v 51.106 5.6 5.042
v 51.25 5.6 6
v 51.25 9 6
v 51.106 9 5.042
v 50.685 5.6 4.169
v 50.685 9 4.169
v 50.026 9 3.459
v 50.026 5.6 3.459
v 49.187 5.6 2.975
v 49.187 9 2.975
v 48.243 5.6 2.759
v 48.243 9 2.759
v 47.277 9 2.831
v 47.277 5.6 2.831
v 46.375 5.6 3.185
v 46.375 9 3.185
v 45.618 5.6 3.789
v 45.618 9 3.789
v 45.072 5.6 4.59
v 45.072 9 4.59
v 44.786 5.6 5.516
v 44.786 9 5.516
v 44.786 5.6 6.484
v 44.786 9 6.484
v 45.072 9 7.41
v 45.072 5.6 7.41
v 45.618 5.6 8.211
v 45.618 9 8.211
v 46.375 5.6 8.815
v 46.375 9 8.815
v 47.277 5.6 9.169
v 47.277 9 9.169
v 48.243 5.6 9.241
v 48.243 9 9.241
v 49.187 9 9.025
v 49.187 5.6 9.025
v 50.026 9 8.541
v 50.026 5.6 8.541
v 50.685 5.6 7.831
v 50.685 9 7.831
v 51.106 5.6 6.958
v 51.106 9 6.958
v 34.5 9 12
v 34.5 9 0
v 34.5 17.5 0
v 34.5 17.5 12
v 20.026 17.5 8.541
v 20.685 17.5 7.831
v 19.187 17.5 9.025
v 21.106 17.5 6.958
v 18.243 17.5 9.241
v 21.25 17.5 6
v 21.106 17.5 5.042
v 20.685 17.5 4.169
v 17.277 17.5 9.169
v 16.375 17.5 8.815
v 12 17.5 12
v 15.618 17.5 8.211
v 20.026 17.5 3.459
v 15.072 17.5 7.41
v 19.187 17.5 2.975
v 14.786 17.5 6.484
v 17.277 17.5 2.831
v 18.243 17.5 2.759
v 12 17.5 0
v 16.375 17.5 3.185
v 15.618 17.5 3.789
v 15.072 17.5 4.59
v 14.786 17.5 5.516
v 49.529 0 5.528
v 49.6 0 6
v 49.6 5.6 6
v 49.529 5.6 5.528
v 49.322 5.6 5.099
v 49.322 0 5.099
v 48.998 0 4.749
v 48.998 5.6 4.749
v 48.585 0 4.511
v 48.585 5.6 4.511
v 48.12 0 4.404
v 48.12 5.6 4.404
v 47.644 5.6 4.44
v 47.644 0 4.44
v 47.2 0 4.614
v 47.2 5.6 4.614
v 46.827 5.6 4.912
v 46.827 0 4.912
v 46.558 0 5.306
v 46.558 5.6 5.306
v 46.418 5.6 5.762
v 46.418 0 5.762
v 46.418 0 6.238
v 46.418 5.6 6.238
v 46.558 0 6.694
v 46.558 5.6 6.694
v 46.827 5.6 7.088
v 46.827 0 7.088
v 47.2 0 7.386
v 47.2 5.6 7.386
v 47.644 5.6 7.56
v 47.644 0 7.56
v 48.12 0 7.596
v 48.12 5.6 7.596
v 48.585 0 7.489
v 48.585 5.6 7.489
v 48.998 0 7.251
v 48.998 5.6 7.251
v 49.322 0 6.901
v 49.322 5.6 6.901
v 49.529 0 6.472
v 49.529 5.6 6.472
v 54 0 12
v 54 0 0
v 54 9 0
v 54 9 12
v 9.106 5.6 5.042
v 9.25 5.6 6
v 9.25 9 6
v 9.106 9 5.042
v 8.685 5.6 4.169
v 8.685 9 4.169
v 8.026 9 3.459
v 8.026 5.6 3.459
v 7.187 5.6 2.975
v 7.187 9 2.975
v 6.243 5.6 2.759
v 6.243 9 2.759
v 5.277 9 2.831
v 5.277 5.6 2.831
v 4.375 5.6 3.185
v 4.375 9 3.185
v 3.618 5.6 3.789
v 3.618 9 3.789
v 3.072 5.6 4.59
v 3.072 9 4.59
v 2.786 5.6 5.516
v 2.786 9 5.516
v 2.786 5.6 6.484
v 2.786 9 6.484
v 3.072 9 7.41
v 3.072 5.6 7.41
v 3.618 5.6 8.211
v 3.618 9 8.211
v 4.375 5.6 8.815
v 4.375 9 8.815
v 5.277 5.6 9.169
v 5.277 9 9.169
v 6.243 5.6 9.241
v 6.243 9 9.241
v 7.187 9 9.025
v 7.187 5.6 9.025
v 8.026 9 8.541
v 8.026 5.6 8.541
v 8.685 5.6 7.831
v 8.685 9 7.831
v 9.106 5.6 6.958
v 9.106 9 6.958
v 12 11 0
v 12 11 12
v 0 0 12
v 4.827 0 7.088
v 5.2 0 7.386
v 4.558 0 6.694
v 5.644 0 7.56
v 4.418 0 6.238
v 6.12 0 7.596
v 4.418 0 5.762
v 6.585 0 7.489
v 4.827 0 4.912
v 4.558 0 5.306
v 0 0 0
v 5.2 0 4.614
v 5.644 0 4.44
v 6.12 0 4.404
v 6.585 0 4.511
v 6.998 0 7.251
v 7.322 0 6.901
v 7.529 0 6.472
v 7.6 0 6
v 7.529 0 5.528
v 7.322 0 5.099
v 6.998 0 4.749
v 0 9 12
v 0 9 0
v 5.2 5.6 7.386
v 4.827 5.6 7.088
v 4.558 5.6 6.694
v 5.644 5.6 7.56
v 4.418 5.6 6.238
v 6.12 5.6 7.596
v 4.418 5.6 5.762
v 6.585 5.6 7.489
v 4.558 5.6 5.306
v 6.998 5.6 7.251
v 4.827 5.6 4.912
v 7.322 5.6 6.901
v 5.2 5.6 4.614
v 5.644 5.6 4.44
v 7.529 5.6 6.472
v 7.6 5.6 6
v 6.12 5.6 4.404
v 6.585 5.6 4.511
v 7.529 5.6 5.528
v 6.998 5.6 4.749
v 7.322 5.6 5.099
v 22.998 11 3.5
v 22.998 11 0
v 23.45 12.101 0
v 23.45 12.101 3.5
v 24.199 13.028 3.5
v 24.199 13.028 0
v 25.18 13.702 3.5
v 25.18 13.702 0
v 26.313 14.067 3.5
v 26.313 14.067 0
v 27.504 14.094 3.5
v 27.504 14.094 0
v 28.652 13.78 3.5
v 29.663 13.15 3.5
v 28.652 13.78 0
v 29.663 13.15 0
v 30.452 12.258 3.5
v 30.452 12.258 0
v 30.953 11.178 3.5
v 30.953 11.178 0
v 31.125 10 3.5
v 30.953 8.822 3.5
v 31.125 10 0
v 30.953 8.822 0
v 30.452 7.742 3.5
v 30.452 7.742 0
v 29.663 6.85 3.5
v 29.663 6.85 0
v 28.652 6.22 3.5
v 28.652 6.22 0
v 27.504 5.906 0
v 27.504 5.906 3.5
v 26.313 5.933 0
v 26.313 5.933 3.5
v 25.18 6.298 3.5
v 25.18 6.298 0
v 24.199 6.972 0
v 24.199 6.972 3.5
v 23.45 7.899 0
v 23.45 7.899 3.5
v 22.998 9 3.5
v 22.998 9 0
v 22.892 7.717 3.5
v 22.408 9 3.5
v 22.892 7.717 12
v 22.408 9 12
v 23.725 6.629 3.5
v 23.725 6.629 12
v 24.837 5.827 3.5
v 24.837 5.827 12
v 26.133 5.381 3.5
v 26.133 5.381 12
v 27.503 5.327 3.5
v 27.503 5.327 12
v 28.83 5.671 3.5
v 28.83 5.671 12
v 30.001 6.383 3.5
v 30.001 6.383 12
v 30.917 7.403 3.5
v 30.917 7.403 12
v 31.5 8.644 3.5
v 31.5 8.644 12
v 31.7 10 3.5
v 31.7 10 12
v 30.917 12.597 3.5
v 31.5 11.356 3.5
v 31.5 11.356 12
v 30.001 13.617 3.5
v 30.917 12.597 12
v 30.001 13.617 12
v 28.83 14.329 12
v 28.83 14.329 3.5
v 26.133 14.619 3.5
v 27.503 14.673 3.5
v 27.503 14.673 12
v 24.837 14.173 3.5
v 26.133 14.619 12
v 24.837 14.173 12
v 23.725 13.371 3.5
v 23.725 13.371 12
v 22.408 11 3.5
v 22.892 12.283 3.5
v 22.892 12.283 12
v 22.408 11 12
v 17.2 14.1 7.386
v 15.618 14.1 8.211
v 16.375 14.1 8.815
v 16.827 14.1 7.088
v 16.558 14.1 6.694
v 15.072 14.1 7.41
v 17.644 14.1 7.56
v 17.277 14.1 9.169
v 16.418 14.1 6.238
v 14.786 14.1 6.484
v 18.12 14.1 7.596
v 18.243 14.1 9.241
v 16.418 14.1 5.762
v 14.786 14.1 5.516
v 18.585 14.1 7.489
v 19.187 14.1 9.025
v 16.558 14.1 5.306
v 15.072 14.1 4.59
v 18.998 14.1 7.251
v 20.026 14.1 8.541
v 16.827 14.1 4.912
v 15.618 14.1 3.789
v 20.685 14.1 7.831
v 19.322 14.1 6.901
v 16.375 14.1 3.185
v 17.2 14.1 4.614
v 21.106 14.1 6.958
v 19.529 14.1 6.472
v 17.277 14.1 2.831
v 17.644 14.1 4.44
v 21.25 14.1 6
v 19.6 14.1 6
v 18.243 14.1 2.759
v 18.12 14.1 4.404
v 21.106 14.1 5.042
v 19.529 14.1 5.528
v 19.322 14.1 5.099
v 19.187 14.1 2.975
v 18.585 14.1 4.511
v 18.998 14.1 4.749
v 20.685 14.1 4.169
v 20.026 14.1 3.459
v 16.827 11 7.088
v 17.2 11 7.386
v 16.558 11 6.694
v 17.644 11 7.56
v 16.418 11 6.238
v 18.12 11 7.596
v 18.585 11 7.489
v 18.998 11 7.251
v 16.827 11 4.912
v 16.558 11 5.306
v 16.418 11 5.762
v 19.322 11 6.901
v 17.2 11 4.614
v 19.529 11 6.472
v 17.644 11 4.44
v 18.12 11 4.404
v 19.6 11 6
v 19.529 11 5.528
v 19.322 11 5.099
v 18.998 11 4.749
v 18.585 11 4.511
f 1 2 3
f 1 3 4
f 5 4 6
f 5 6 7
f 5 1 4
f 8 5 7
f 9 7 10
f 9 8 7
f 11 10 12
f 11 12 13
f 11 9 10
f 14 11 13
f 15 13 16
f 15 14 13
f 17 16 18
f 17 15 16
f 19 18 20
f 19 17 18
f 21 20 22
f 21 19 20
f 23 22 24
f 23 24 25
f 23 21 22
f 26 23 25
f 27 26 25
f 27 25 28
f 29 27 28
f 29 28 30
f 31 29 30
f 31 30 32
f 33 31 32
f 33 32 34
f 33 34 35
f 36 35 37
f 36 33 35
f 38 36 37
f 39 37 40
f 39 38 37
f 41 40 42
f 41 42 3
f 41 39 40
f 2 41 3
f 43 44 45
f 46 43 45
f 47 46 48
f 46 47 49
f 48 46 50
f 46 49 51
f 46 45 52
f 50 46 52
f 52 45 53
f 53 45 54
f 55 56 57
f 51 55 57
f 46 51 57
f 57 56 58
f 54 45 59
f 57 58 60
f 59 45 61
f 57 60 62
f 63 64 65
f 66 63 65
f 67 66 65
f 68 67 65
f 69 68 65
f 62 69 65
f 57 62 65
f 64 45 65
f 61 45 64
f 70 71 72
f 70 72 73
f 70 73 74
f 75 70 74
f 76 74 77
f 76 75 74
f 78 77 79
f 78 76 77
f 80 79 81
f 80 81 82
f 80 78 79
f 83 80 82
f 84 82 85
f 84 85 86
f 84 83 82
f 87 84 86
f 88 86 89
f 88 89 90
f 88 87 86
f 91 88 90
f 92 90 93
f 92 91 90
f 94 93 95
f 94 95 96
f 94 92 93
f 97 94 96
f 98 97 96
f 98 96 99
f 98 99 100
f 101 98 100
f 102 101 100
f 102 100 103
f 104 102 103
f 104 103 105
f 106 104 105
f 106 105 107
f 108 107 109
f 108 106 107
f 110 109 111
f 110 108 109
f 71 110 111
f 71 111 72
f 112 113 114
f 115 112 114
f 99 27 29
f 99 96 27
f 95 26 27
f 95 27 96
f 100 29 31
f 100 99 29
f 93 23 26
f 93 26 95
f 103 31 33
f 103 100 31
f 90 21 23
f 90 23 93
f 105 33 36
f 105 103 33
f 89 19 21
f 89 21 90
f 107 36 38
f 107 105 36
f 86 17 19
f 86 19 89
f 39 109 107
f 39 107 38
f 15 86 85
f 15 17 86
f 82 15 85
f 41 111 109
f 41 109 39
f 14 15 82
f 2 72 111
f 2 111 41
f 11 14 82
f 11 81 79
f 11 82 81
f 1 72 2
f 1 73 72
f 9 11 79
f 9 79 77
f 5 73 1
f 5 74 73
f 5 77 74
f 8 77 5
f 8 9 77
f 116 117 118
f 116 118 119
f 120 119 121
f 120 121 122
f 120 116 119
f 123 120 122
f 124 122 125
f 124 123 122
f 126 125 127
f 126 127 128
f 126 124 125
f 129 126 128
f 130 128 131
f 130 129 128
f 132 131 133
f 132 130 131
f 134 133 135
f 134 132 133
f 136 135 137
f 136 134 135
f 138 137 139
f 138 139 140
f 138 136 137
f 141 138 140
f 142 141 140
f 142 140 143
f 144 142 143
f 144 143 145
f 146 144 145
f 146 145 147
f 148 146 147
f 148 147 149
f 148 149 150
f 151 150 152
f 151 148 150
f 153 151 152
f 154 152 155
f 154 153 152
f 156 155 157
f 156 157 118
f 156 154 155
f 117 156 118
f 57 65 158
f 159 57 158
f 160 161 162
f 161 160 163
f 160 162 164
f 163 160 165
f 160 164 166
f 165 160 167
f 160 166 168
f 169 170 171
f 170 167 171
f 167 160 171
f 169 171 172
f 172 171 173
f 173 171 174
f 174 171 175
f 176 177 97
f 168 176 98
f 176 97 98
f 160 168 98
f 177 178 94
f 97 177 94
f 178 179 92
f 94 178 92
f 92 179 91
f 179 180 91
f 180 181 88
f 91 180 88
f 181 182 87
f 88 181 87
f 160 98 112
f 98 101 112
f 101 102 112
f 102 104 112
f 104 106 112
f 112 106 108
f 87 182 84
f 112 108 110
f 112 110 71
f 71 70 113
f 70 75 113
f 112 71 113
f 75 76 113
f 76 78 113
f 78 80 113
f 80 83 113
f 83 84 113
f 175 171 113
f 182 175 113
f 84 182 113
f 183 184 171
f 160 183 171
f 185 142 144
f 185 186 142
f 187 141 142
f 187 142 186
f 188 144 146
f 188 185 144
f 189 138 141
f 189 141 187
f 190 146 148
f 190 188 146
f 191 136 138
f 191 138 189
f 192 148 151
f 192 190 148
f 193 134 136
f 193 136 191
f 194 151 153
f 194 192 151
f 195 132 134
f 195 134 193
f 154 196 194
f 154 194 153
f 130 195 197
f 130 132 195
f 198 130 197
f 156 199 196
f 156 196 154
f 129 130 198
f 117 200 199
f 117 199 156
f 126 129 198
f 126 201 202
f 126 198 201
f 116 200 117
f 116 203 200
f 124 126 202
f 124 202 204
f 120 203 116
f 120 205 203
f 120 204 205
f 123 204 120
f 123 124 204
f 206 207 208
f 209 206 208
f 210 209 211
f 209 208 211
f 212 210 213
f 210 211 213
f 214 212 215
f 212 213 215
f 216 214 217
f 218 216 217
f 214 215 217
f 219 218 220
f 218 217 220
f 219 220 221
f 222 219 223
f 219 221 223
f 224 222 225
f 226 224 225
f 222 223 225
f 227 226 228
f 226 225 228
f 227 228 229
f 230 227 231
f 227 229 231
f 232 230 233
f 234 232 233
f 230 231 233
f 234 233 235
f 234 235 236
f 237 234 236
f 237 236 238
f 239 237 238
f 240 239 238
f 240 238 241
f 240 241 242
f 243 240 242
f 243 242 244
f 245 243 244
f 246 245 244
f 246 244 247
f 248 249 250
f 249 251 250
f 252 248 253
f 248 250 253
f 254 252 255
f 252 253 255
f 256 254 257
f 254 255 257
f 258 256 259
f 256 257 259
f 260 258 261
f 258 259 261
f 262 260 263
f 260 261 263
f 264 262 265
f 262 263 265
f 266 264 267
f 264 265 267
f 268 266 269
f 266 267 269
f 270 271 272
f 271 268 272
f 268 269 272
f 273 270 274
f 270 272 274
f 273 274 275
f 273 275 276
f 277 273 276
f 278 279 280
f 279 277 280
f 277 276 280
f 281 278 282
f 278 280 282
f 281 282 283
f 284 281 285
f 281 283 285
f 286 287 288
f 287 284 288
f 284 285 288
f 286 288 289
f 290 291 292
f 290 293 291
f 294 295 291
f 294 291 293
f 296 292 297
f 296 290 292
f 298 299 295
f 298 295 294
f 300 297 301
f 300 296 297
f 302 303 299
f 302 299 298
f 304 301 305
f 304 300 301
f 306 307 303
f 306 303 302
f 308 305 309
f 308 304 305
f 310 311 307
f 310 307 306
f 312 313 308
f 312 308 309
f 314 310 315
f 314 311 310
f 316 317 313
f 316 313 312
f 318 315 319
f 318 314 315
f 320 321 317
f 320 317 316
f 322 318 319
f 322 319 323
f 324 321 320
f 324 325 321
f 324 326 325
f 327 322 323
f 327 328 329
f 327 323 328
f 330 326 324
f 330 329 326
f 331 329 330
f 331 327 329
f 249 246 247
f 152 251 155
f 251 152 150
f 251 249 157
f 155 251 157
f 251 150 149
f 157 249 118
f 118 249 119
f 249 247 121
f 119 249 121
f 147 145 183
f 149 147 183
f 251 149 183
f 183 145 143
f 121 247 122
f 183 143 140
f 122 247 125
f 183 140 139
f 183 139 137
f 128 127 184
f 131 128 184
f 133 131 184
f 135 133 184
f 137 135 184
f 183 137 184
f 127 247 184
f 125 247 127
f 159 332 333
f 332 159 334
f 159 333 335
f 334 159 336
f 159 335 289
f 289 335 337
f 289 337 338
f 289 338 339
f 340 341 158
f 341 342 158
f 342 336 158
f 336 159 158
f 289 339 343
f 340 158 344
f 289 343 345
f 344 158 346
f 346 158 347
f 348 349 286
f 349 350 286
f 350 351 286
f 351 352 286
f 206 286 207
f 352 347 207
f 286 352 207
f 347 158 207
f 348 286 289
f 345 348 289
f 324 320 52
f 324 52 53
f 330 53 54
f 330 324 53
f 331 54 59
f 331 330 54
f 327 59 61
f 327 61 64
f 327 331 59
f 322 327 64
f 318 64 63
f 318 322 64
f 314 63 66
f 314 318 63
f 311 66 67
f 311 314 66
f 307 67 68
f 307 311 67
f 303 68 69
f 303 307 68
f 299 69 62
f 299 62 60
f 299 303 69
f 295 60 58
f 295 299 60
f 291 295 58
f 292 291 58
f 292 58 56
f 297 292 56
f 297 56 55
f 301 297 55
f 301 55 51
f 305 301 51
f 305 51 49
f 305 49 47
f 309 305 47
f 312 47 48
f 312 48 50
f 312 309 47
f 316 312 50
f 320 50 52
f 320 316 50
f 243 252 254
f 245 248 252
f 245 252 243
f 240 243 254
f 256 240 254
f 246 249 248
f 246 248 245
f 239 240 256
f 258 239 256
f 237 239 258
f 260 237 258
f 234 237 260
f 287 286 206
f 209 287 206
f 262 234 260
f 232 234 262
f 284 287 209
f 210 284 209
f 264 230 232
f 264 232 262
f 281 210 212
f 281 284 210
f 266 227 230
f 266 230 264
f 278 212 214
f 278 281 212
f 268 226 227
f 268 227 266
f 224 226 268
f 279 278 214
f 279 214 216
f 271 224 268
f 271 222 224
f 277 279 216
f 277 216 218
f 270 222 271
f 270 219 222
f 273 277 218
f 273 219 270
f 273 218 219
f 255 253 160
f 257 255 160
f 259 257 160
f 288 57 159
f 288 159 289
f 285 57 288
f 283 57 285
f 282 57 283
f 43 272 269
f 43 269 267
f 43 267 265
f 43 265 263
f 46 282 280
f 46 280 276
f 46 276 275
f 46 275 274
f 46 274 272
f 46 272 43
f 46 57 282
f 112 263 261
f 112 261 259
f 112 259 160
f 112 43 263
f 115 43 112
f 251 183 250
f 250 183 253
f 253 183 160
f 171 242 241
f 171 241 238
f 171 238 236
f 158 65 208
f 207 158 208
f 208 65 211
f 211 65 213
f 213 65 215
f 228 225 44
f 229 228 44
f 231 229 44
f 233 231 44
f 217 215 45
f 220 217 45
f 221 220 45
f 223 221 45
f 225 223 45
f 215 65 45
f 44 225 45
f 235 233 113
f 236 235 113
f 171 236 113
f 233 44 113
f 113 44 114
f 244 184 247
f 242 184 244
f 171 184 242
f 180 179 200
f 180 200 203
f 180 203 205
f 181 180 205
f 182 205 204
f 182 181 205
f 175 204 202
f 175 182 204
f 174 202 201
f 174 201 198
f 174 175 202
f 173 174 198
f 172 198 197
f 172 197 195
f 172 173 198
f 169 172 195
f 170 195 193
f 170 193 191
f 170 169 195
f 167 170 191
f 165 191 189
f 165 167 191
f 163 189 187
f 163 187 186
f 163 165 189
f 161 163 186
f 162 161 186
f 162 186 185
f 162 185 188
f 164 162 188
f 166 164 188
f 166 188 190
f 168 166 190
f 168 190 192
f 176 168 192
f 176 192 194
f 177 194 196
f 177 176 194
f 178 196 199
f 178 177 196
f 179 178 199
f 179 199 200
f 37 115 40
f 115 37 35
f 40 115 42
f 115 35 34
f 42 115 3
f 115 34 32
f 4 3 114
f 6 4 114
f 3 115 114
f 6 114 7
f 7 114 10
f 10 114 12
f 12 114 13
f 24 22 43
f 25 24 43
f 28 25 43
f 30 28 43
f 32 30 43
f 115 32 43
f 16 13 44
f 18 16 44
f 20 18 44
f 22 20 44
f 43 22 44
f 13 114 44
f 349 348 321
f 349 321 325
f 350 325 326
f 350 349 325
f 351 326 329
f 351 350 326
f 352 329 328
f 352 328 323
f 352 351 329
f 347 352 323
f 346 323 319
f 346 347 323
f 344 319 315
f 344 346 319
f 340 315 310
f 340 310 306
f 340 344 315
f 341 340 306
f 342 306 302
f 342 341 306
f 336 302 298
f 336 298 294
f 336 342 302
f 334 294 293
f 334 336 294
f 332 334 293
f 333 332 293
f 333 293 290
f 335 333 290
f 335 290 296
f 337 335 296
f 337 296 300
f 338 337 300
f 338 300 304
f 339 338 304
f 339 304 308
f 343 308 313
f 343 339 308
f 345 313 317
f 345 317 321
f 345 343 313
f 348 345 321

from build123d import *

# Parameters (mm, degrees)
AUFSATZ_LINEAR_AUSTRAGEN1_DEPTH                = 12
SKIZZE4_R                                      = 4.7
SCHNITT_LINEAR_AUSTRAGEN1_DEPTH                = 8.5
STIRNSENKUNG_START                             = 5.6
STIRNSENKUNG_F_R_M3_ZYLINDERSCHRAUBE_2_R       = 3.25
STIRNSENKUNG_F_R_M3_ZYLINDERSCHRAUBE_MIT_DEPTH = 3.4
STIRNSENKUNG_START_2                           = 14.1
STIRNSENKUNG_F_R_M3_ZYLINDERSCHRAUBE_3_O_R     = 3.25
STIRNSENKUNG_F_R_M3_ZYLINDERSCHRAUBE_3_DEPTH   = 3.4
STIRNSENKUNG_F_R_M3_ZYLINDERSCHRAUBE_4_O_R     = 1.6
STIRNSENKUNG_F_R_M3_ZYLINDERSCHRAUBE_4_DEPTH   = 5.6
STIRNSENKUNG_START_3                           = 11
STIRNSENKUNG_F_R_M3_ZYLINDERSCHRAUBE_5_O_R     = 1.6
STIRNSENKUNG_F_R_M3_ZYLINDERSCHRAUBE_5_DEPTH   = 3.1


# Read off the part's stored shape, not the designer's step: Stirnsenkung für M3 Zylinderschraube mit Innensechskant1
with BuildPart() as part:
    # Skizze1 → Aufsatz-Linear austragen1 (new body)
    with BuildSketch(Plane.XY):
        with BuildLine():
            Line((0, 0), (54, 0))
            Line((54, 0), (54, 9))
            Line((54, 9), (34.5, 9))
            Line((34.5, 9), (34.5, 17.5))
            Line((34.5, 17.5), (12, 17.5))
            Line((12, 17.5), (12, 11))
            Line((12, 11), (22.998047352, 11))
            ThreePointArc((22.998047352, 11), (31.125, 10), (22.998047352, 9))
            Line((22.998047352, 9), (0, 9))
            Line((0, 9), (0, 0))
        make_face()
    extrude(amount=AUFSATZ_LINEAR_AUSTRAGEN1_DEPTH)

    # Skizze4 → Schnitt-Linear austragen1 (cut)
    with BuildSketch(Plane.XY.offset(12)):
        with Locations((27, 10)):
            Circle(SKIZZE4_R)
    extrude(amount=-SCHNITT_LINEAR_AUSTRAGEN1_DEPTH, mode=Mode.SUBTRACT)

    # Stirnsenkung f_r M3 Zylinderschraube 2 → Stirnsenkung für M3 Zylinderschraube mit Innensechskant1 (cut)
    with BuildSketch(Plane(origin=(0, 0, 0), x_dir=(1, 0, 0), z_dir=(0, 1, 0)).offset(STIRNSENKUNG_START)):
        with Locations((48, -6)):
            Circle(STIRNSENKUNG_F_R_M3_ZYLINDERSCHRAUBE_2_R)
        with Locations((6, -6)):
            Circle(STIRNSENKUNG_F_R_M3_ZYLINDERSCHRAUBE_2_R)
    extrude(amount=STIRNSENKUNG_F_R_M3_ZYLINDERSCHRAUBE_MIT_DEPTH, mode=Mode.SUBTRACT)

    # Stirnsenkung f_r M3 Zylinderschraube 3 o → Stirnsenkung f_r M3 Zylinderschraube 3 (cut)
    with BuildSketch(Plane(origin=(0, 0, 0), x_dir=(1, 0, 0), z_dir=(0, 1, 0)).offset(STIRNSENKUNG_START_2)):
        with Locations((18, -6)):
            Circle(STIRNSENKUNG_F_R_M3_ZYLINDERSCHRAUBE_3_O_R)
    extrude(amount=STIRNSENKUNG_F_R_M3_ZYLINDERSCHRAUBE_3_DEPTH, mode=Mode.SUBTRACT)

    # Stirnsenkung f_r M3 Zylinderschraube 4 o → Stirnsenkung f_r M3 Zylinderschraube 4 (cut)
    with BuildSketch(Plane(origin=(0, 0, 0), x_dir=(1, 0, 0), z_dir=(0, 1, 0))):
        with Locations((48, -6)):
            Circle(STIRNSENKUNG_F_R_M3_ZYLINDERSCHRAUBE_4_O_R)
        with Locations((6, -6)):
            Circle(STIRNSENKUNG_F_R_M3_ZYLINDERSCHRAUBE_4_O_R)
    extrude(amount=STIRNSENKUNG_F_R_M3_ZYLINDERSCHRAUBE_4_DEPTH, mode=Mode.SUBTRACT)

    # Stirnsenkung f_r M3 Zylinderschraube 5 o → Stirnsenkung f_r M3 Zylinderschraube 5 (cut)
    with BuildSketch(Plane(origin=(0, 0, 0), x_dir=(1, 0, 0), z_dir=(0, 1, 0)).offset(STIRNSENKUNG_START_3)):
        with Locations((18, -6)):
            Circle(STIRNSENKUNG_F_R_M3_ZYLINDERSCHRAUBE_5_O_R)
    extrude(amount=STIRNSENKUNG_F_R_M3_ZYLINDERSCHRAUBE_5_DEPTH, mode=Mode.SUBTRACT)


solid = part.part
